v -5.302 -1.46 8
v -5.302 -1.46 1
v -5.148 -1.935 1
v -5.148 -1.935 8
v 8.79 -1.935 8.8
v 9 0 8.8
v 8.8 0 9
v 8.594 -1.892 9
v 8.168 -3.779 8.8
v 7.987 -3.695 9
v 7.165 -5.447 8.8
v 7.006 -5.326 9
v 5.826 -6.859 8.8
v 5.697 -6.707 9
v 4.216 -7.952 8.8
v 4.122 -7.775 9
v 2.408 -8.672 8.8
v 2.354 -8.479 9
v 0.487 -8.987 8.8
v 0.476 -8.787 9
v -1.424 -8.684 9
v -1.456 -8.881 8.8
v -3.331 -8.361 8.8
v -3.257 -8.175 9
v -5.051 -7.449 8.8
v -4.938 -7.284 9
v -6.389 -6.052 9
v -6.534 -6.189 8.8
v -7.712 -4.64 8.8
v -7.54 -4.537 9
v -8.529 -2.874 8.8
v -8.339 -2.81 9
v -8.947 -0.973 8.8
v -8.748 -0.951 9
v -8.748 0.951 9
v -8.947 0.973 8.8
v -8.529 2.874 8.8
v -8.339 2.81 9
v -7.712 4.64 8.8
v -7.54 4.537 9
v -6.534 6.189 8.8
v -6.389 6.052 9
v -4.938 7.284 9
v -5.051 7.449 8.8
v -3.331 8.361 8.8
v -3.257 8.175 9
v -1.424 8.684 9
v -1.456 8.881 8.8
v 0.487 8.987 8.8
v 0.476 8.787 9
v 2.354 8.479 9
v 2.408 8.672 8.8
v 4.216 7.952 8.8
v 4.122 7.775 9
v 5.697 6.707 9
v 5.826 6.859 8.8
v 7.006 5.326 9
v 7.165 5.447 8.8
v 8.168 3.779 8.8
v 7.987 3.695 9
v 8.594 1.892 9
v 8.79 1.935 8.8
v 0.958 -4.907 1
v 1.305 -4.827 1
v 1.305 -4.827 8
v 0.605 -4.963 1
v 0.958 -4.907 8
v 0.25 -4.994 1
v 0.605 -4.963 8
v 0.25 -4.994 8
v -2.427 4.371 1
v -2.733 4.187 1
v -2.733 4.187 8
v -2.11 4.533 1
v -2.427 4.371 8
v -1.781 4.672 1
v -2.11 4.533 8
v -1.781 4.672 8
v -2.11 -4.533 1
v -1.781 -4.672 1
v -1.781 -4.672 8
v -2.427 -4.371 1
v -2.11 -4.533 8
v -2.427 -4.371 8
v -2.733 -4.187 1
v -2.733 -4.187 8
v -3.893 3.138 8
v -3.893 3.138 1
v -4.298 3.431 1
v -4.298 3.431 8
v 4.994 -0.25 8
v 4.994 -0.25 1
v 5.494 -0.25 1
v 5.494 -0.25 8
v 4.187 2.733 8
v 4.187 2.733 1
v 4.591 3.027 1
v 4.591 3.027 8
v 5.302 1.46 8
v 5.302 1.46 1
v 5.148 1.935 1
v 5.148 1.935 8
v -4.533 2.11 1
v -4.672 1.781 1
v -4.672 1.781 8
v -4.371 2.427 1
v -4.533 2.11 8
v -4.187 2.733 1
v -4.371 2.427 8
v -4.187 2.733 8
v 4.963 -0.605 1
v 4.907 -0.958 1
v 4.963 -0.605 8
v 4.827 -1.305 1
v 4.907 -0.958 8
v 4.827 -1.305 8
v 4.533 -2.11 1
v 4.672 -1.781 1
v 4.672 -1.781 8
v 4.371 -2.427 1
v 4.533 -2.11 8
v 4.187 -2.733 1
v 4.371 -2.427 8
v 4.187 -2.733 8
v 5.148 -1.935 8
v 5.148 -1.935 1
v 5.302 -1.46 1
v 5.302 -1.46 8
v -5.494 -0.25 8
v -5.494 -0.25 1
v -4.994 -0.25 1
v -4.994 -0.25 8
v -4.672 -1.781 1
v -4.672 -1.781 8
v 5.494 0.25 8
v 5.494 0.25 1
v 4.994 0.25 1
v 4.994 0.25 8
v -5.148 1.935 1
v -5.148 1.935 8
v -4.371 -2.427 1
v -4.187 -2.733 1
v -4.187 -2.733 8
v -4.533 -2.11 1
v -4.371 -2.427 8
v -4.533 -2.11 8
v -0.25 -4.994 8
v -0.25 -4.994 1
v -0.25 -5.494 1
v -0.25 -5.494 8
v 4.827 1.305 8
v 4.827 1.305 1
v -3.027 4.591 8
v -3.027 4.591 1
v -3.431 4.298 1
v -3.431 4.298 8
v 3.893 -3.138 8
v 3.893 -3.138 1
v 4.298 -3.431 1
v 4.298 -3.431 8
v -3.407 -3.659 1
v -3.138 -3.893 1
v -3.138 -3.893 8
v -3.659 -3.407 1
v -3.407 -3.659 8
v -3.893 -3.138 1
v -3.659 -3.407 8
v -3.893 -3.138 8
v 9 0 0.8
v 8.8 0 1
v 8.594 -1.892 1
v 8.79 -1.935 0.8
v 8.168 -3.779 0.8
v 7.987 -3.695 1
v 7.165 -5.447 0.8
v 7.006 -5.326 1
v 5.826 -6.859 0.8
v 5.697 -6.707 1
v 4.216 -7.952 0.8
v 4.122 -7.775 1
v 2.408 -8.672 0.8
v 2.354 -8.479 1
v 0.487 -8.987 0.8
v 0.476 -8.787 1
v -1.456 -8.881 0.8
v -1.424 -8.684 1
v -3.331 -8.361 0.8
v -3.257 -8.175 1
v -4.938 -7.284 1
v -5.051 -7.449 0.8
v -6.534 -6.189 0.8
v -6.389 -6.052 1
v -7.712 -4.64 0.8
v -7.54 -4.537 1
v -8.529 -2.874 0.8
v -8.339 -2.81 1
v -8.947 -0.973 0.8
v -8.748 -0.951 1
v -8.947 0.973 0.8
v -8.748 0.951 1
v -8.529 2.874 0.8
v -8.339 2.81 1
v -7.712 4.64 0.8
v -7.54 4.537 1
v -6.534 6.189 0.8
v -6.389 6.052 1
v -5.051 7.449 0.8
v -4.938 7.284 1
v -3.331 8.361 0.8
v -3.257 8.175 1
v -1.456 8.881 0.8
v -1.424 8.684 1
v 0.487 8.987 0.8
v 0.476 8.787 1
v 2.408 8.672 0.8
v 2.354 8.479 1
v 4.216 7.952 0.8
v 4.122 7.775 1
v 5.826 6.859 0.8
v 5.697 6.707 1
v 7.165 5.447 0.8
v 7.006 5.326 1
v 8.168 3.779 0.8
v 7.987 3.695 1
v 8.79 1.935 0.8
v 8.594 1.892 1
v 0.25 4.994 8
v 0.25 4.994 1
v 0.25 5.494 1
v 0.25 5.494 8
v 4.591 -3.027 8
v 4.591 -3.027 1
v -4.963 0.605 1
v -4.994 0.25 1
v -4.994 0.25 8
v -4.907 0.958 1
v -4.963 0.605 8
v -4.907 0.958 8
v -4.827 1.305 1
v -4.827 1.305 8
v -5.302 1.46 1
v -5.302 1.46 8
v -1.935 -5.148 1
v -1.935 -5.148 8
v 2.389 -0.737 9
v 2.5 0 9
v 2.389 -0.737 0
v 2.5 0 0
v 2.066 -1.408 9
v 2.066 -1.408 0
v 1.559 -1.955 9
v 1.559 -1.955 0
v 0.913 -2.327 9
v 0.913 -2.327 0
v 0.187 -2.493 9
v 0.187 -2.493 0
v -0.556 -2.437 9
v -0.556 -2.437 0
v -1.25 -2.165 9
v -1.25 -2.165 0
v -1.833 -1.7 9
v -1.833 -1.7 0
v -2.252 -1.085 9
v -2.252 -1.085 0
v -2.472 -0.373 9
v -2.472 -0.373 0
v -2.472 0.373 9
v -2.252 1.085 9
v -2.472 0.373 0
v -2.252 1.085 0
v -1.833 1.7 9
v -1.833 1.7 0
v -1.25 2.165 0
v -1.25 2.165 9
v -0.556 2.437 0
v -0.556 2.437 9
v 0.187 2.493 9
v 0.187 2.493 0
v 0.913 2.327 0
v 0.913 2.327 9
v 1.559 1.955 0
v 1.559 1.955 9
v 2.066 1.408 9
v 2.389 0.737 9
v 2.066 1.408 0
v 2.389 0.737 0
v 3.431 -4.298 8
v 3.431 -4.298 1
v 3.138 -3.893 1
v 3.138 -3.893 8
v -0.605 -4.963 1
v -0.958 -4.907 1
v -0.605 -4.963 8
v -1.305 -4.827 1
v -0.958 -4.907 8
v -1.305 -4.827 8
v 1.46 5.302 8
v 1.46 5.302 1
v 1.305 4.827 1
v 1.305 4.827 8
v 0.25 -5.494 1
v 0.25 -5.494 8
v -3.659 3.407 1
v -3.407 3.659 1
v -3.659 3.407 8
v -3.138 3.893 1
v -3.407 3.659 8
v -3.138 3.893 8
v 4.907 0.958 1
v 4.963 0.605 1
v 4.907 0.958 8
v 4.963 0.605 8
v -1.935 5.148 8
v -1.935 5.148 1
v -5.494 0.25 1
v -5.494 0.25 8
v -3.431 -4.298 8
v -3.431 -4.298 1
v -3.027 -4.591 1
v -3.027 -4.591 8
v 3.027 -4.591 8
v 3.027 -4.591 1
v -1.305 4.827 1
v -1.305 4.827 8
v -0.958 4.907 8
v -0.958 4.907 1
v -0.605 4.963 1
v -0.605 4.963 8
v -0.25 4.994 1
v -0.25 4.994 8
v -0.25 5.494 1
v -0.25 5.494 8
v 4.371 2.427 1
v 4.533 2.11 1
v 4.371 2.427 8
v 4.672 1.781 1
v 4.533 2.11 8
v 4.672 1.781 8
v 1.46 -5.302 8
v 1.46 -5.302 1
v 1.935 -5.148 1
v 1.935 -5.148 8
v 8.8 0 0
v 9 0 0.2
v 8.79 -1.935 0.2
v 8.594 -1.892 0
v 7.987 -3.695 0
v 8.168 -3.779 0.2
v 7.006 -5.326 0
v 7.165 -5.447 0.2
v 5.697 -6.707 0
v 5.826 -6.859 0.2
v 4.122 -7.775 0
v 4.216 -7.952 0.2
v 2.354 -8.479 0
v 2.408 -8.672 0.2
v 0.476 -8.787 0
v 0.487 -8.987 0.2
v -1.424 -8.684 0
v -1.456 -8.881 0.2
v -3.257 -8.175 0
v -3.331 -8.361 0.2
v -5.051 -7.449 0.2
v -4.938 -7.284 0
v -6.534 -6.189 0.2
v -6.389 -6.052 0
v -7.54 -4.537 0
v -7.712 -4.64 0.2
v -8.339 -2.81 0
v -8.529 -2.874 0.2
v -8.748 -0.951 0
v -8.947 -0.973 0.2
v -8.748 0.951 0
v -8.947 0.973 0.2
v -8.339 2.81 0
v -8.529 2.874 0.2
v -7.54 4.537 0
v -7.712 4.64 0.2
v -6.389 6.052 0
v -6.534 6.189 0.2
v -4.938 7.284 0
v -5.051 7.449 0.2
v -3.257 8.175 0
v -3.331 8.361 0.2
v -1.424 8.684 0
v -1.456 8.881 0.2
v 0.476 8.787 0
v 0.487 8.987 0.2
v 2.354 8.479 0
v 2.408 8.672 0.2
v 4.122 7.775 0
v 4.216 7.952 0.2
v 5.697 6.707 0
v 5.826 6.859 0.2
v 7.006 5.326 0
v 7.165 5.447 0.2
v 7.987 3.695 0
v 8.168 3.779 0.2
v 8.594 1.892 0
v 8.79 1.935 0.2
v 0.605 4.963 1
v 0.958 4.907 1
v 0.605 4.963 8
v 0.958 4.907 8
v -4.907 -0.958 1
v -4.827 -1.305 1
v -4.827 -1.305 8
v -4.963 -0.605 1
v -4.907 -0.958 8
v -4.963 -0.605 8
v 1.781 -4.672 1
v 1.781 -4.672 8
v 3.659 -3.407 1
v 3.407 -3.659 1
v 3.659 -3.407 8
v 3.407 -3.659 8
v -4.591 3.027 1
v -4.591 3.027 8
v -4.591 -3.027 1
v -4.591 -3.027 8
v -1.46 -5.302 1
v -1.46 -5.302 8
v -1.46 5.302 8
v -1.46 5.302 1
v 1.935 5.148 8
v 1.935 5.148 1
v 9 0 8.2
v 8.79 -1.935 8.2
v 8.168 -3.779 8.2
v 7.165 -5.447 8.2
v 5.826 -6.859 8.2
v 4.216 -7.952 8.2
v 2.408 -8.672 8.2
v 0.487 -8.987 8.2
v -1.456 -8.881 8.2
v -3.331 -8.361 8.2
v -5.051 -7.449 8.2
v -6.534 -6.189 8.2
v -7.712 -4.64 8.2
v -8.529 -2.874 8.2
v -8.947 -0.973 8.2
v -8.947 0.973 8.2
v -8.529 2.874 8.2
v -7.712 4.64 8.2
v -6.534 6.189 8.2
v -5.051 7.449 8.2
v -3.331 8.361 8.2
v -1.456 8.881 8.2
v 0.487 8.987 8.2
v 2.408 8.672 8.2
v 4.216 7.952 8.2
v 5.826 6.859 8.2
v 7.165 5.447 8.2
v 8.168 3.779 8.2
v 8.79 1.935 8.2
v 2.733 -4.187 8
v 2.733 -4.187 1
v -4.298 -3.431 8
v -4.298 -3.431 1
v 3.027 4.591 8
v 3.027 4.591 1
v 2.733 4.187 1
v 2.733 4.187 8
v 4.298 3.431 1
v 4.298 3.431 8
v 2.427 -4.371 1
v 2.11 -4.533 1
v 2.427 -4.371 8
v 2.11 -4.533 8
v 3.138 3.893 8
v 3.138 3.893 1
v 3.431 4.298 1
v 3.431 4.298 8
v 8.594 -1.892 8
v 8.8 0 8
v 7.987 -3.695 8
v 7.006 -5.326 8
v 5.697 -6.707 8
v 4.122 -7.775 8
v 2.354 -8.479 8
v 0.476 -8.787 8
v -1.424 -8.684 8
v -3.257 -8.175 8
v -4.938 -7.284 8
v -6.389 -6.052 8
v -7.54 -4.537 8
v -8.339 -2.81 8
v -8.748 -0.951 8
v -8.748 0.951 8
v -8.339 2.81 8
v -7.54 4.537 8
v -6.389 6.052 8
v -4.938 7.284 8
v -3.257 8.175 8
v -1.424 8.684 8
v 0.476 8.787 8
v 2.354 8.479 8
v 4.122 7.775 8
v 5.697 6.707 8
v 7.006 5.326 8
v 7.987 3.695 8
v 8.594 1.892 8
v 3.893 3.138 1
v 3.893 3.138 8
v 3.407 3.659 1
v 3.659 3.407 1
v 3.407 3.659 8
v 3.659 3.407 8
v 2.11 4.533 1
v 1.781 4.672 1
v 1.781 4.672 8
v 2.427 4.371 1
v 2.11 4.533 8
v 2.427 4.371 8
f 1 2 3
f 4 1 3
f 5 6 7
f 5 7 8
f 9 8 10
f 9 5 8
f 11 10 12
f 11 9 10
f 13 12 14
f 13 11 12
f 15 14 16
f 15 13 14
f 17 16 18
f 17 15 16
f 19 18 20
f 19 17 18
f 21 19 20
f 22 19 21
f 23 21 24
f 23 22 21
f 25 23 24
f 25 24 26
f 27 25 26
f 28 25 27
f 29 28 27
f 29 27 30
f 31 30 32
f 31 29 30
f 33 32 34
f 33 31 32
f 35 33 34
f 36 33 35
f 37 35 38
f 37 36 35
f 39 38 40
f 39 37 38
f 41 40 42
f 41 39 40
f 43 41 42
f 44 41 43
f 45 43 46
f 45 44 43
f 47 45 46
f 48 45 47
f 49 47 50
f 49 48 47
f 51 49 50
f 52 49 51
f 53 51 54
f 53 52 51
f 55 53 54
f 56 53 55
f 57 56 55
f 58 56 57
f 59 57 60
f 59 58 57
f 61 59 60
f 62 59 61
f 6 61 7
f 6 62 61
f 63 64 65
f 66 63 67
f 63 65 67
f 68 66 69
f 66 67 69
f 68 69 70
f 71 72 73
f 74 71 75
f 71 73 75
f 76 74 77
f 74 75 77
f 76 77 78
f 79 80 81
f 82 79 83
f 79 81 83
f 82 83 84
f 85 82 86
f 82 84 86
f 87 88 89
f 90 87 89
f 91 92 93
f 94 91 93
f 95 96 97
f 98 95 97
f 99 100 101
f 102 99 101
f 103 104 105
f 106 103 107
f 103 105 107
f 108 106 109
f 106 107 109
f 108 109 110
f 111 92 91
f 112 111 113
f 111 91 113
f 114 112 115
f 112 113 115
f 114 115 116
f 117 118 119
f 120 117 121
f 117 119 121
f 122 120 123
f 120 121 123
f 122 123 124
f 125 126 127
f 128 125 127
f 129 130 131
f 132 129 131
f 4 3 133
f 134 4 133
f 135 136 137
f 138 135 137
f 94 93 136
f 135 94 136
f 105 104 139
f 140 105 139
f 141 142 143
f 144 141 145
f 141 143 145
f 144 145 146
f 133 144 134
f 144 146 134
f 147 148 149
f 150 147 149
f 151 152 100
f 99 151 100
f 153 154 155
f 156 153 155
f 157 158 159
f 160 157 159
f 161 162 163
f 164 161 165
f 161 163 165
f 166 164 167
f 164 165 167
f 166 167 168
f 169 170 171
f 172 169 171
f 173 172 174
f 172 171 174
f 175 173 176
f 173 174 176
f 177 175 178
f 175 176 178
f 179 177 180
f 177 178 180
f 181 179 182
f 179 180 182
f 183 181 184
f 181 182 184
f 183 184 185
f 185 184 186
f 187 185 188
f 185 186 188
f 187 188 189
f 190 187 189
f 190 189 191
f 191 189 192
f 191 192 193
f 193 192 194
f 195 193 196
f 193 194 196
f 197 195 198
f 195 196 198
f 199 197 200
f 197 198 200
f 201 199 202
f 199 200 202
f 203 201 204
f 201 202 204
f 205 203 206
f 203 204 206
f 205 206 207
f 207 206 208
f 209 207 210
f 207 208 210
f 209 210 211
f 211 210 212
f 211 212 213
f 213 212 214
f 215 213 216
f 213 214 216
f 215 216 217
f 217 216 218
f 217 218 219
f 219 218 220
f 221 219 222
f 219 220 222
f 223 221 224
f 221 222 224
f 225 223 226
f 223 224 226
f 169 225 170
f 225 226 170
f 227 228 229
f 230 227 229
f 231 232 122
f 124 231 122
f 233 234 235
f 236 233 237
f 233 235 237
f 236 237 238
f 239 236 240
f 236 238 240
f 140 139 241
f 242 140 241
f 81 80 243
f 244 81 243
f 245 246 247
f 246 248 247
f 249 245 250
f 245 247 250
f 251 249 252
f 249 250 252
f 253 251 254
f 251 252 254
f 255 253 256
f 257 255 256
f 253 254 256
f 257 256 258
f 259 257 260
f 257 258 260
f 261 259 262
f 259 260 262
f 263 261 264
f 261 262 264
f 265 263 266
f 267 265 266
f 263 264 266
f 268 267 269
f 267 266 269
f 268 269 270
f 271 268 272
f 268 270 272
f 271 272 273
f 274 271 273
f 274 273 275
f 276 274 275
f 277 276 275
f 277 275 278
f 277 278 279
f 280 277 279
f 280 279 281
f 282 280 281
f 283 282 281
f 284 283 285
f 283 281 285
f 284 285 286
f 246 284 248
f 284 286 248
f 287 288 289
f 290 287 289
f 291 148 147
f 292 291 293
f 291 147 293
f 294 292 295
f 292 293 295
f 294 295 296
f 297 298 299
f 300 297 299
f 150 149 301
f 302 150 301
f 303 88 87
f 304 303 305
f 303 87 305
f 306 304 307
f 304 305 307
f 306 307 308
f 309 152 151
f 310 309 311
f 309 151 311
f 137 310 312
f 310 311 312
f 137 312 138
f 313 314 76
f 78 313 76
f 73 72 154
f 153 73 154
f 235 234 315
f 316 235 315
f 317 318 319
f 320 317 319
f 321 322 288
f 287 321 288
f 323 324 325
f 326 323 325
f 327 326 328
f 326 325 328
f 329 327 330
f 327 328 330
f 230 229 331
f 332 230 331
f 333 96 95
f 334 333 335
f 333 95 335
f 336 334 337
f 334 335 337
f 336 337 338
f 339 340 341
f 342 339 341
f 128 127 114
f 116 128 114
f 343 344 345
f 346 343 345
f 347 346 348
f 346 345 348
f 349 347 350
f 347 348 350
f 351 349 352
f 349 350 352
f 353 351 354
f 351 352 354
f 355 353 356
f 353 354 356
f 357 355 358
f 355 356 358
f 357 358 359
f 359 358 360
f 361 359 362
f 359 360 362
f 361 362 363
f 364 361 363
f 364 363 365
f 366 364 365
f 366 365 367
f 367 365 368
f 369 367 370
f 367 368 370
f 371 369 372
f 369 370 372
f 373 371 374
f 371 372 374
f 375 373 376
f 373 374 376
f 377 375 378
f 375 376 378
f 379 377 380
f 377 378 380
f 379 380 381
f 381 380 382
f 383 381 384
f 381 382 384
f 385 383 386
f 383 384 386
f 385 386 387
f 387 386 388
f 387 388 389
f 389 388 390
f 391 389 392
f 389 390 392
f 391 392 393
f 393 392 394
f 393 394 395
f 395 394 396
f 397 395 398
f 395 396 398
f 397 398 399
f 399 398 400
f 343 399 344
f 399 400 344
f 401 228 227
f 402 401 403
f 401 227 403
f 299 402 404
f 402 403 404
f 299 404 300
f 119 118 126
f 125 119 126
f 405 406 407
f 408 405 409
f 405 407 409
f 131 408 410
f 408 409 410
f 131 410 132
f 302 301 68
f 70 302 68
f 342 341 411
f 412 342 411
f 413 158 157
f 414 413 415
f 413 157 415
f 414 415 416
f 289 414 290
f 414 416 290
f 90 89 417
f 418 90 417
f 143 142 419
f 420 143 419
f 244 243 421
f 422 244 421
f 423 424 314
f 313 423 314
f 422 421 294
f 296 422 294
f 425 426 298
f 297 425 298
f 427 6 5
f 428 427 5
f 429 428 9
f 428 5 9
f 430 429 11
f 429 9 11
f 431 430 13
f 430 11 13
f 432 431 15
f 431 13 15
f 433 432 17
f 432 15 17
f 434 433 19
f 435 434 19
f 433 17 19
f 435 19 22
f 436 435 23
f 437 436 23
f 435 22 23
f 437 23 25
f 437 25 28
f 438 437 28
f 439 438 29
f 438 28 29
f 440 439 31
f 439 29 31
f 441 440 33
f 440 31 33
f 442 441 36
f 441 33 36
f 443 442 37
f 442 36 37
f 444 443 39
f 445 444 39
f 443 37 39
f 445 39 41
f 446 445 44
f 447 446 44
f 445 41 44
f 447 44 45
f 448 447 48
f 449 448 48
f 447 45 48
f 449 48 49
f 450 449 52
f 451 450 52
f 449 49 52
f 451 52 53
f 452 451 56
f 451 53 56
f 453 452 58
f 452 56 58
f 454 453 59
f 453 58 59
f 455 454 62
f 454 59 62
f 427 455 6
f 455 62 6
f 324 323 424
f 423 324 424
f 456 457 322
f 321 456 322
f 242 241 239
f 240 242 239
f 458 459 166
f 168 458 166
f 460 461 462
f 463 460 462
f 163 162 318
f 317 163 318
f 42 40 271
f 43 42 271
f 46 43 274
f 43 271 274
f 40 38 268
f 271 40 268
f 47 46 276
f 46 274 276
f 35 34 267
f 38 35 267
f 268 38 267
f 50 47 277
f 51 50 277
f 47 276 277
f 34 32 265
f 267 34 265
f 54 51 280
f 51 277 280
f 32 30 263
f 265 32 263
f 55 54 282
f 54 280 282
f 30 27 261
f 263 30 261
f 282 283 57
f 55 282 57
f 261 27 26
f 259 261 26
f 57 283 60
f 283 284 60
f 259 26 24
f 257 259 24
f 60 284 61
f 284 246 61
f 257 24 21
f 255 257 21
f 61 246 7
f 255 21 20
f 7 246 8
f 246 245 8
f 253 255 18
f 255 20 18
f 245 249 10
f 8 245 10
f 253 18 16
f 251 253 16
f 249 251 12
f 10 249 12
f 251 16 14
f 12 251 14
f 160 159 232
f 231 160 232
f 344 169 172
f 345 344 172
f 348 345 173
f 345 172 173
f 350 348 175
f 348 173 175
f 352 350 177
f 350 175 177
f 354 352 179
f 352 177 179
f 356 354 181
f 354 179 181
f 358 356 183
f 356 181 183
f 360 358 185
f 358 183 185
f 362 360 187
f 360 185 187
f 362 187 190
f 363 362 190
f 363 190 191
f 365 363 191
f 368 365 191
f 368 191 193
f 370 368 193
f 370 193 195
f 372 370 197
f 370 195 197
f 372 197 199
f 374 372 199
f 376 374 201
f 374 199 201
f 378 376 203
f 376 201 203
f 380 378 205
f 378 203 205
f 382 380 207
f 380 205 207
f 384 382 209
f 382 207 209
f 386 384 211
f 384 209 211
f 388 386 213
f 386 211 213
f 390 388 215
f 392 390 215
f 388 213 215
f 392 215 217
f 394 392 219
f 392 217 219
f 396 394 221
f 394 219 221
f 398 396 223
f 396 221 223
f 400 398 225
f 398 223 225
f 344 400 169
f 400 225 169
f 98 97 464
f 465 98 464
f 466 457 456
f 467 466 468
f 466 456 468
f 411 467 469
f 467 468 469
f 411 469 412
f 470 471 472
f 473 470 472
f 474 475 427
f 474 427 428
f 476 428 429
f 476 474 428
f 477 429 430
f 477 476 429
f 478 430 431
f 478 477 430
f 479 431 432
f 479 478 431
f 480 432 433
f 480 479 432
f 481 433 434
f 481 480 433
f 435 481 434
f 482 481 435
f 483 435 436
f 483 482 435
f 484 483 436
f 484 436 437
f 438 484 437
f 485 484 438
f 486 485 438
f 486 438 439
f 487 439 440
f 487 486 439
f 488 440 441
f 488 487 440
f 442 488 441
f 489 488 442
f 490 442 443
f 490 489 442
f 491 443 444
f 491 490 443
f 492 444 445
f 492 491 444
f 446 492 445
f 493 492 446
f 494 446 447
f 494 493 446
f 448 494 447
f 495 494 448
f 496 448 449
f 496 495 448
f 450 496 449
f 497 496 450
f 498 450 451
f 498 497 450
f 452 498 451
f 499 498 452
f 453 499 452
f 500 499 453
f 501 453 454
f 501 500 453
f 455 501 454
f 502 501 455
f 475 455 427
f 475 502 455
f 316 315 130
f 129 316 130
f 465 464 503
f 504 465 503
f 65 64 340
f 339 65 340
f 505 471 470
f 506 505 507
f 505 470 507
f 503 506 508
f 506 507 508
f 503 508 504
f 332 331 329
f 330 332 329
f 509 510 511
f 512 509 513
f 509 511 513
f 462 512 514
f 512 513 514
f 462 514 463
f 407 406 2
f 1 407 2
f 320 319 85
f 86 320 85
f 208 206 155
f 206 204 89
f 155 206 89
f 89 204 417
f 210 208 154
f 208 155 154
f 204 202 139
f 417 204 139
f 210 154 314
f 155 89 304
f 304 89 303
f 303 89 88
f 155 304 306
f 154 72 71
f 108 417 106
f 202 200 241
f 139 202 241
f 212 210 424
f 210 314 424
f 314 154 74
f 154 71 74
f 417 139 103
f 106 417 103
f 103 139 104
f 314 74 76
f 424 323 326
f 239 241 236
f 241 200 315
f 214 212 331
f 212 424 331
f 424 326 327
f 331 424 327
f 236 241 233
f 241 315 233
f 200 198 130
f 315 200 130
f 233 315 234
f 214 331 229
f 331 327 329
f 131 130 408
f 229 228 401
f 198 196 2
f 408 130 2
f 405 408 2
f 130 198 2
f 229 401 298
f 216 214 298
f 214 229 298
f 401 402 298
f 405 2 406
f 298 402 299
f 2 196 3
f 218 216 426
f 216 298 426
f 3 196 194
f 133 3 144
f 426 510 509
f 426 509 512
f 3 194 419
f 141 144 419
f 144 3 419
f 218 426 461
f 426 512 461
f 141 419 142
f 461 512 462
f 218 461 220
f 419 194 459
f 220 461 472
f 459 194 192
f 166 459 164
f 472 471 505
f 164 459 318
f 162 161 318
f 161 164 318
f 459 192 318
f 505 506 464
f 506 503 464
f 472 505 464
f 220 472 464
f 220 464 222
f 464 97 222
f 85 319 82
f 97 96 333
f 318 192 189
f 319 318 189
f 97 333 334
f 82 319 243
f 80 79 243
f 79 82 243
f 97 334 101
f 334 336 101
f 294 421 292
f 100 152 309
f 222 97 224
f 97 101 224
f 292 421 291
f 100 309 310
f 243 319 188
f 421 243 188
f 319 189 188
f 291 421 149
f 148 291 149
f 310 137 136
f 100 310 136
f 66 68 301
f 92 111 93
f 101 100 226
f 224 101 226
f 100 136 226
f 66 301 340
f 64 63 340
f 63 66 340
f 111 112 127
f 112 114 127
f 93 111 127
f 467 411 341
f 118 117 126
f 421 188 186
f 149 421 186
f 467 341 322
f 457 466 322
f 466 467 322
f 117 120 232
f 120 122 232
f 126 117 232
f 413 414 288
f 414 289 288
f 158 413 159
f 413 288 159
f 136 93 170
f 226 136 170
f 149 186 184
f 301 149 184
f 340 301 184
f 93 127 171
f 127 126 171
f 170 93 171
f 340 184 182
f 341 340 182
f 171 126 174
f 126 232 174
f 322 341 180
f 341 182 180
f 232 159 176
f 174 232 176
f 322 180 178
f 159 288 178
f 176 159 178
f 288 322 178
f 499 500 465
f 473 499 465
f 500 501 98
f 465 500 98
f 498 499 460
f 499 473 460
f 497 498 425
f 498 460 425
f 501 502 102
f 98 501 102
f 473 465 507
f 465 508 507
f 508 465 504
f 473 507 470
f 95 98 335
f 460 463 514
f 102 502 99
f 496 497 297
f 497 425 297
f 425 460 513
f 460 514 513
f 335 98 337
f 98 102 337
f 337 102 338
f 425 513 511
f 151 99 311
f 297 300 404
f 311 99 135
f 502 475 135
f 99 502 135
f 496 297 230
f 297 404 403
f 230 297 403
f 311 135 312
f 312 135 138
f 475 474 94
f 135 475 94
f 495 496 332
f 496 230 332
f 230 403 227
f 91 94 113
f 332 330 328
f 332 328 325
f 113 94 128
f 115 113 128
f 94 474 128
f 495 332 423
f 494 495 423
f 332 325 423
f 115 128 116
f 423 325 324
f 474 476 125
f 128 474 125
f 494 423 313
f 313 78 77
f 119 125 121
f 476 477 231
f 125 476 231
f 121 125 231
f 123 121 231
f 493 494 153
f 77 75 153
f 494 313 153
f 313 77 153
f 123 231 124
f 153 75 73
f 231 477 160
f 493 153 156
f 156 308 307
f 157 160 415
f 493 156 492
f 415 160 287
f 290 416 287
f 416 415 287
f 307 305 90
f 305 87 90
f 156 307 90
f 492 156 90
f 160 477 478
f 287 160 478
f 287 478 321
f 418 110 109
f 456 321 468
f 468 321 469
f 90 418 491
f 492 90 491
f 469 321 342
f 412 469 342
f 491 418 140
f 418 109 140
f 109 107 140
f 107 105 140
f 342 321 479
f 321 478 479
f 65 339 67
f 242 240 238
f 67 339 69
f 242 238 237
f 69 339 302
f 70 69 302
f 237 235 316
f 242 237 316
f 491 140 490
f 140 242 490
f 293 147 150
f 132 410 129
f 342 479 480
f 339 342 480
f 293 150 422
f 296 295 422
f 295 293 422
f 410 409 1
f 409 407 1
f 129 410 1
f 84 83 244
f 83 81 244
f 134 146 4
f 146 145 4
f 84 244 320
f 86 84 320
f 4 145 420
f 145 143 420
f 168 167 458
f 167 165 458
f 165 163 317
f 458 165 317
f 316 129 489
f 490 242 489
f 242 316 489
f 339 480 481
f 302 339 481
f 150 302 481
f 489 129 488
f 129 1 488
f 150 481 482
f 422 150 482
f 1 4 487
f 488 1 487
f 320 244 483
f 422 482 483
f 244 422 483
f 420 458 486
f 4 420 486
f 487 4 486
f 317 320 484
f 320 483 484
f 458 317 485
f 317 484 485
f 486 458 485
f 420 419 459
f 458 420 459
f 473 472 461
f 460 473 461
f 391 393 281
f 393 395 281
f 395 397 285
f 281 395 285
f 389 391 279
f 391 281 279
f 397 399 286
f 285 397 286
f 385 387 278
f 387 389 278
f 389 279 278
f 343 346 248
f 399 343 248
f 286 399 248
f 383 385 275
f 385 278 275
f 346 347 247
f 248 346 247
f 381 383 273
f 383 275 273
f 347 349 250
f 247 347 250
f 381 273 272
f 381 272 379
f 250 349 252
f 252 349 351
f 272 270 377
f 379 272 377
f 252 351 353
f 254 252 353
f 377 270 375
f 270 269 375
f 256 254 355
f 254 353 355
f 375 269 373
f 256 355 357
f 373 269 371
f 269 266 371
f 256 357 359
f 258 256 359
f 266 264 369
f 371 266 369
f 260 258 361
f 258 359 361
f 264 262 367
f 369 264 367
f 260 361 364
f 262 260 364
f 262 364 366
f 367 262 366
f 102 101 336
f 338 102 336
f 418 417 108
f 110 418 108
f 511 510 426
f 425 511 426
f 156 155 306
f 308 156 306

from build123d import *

# Parameters (mm, degrees)
F3_DEPTH        = 7
F3_COPIES_COUNT = 20
F4_SIZE         = 0.2


# Not quite as in the source:
# - a pattern or mirror of a feature is missing from the dataset's text; its kind, count and spacing are read off the source's solid


with BuildPart() as f1:
    # F0 (on Front) → F1 (revolve)
    with BuildSketch(Plane.XZ):
        Polygon((2.5, 9), (2.5, 0), (9, 0), (9, 1), (5, 1), (5, 8), (9, 8), (9, 9), align=None)
    revolve(axis=Axis((0, 0, 4.5), (0, 0, -1)))

    # F2 (on face) → F3 (join, through all)
    with BuildSketch(Plane.XY.offset(1)):
        with BuildLine():
            Line((-0.25, 5.4937460889), (-0.25, 4.9937460889))
            ThreePointArc((-0.25, 4.9937460889), (0, 5), (0.25, 4.9937460889))
            Line((0.25, 4.9937460889), (0.25, 5.4937460889))
            Line((0.25, 5.4937460889), (-0.25, 5.4937460889))
        make_face()
    f3 = extrude(amount=F3_DEPTH)

    # F3_copies: F3 ×20 about axis
    f3_copies_axis = Axis((0, 0, 0), (0, 0, 1))
    for i in range(1, F3_COPIES_COUNT):
        add(f3.rotate(f3_copies_axis, i * 360 / F3_COPIES_COUNT))

    # F4
    f4_edges = [f1.edges().sort_by_distance(p)[0] for p in [
        (-9, 0, 9),
        (-9, 0, 8),
        (-9, 0, 1),
        (-9, 0, 0),
    ]]
    chamfer(f4_edges, length=F4_SIZE)


solid = f1.part
